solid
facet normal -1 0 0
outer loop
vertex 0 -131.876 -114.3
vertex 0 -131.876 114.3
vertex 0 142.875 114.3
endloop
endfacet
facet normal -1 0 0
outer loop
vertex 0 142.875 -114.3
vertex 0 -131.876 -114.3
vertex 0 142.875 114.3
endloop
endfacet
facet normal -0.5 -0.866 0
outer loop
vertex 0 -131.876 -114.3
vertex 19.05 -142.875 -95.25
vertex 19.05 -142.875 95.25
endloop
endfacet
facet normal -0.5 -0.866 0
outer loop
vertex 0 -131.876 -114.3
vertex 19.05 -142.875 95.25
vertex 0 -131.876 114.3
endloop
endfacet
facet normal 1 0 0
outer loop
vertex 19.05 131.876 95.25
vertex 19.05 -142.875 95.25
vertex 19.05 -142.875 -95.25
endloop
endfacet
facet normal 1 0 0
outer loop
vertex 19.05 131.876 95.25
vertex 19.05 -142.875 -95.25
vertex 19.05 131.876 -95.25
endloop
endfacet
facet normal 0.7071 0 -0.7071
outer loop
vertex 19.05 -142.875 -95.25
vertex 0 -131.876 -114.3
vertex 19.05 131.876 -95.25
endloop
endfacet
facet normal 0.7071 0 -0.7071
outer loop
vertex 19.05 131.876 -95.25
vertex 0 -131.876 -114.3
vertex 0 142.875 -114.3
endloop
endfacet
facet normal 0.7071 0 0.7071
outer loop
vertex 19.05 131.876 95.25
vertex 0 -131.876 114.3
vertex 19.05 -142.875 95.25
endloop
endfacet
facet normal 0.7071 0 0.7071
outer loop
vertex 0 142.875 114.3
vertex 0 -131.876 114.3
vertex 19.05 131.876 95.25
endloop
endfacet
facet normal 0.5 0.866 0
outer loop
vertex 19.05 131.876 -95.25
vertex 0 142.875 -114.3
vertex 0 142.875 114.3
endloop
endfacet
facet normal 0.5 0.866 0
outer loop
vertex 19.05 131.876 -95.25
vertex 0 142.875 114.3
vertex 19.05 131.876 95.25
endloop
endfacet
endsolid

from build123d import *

# Parameters (mm, degrees)
F0_W     = 285.75
F0_H     = 228.6
F1_DEPTH = 19.05
F3_DEPTH = 228.601
F4_SIZE  = 19.04999


# Not quite as in the source:
# - a fillet or chamfer is up to 0.001 mm smaller than in the source, because OpenCascade refuses the exact size


with BuildPart() as f1:
    # F0 (on Right) → F1 (new body)
    with BuildSketch(Plane.YZ):
        Rectangle(F0_W, F0_H)
    extrude(amount=F1_DEPTH)

    # F2 (on face) → F3 (cut, through all)
    with BuildSketch(Plane.XY.offset(114.3)):
        Polygon((0, -142.875), (19.05, -142.875), (0, -131.8764773719), align=None)
        Polygon((19.05, 142.875), (0, 142.875), (19.05, 131.8764773719), align=None)
    extrude(amount=-F3_DEPTH, mode=Mode.SUBTRACT)

    # F4 (size 19.05 in the source; OpenCascade refuses exactly that, so slightly less here)
    f4_edges = [f1.edges().sort_by_distance(p)[0] for p in [
        (19.05, -5.499261, 114.3),
        (19.05, -5.499261, -114.3),
    ]]
    chamfer(f4_edges, length=F4_SIZE)


solid = f1.part
